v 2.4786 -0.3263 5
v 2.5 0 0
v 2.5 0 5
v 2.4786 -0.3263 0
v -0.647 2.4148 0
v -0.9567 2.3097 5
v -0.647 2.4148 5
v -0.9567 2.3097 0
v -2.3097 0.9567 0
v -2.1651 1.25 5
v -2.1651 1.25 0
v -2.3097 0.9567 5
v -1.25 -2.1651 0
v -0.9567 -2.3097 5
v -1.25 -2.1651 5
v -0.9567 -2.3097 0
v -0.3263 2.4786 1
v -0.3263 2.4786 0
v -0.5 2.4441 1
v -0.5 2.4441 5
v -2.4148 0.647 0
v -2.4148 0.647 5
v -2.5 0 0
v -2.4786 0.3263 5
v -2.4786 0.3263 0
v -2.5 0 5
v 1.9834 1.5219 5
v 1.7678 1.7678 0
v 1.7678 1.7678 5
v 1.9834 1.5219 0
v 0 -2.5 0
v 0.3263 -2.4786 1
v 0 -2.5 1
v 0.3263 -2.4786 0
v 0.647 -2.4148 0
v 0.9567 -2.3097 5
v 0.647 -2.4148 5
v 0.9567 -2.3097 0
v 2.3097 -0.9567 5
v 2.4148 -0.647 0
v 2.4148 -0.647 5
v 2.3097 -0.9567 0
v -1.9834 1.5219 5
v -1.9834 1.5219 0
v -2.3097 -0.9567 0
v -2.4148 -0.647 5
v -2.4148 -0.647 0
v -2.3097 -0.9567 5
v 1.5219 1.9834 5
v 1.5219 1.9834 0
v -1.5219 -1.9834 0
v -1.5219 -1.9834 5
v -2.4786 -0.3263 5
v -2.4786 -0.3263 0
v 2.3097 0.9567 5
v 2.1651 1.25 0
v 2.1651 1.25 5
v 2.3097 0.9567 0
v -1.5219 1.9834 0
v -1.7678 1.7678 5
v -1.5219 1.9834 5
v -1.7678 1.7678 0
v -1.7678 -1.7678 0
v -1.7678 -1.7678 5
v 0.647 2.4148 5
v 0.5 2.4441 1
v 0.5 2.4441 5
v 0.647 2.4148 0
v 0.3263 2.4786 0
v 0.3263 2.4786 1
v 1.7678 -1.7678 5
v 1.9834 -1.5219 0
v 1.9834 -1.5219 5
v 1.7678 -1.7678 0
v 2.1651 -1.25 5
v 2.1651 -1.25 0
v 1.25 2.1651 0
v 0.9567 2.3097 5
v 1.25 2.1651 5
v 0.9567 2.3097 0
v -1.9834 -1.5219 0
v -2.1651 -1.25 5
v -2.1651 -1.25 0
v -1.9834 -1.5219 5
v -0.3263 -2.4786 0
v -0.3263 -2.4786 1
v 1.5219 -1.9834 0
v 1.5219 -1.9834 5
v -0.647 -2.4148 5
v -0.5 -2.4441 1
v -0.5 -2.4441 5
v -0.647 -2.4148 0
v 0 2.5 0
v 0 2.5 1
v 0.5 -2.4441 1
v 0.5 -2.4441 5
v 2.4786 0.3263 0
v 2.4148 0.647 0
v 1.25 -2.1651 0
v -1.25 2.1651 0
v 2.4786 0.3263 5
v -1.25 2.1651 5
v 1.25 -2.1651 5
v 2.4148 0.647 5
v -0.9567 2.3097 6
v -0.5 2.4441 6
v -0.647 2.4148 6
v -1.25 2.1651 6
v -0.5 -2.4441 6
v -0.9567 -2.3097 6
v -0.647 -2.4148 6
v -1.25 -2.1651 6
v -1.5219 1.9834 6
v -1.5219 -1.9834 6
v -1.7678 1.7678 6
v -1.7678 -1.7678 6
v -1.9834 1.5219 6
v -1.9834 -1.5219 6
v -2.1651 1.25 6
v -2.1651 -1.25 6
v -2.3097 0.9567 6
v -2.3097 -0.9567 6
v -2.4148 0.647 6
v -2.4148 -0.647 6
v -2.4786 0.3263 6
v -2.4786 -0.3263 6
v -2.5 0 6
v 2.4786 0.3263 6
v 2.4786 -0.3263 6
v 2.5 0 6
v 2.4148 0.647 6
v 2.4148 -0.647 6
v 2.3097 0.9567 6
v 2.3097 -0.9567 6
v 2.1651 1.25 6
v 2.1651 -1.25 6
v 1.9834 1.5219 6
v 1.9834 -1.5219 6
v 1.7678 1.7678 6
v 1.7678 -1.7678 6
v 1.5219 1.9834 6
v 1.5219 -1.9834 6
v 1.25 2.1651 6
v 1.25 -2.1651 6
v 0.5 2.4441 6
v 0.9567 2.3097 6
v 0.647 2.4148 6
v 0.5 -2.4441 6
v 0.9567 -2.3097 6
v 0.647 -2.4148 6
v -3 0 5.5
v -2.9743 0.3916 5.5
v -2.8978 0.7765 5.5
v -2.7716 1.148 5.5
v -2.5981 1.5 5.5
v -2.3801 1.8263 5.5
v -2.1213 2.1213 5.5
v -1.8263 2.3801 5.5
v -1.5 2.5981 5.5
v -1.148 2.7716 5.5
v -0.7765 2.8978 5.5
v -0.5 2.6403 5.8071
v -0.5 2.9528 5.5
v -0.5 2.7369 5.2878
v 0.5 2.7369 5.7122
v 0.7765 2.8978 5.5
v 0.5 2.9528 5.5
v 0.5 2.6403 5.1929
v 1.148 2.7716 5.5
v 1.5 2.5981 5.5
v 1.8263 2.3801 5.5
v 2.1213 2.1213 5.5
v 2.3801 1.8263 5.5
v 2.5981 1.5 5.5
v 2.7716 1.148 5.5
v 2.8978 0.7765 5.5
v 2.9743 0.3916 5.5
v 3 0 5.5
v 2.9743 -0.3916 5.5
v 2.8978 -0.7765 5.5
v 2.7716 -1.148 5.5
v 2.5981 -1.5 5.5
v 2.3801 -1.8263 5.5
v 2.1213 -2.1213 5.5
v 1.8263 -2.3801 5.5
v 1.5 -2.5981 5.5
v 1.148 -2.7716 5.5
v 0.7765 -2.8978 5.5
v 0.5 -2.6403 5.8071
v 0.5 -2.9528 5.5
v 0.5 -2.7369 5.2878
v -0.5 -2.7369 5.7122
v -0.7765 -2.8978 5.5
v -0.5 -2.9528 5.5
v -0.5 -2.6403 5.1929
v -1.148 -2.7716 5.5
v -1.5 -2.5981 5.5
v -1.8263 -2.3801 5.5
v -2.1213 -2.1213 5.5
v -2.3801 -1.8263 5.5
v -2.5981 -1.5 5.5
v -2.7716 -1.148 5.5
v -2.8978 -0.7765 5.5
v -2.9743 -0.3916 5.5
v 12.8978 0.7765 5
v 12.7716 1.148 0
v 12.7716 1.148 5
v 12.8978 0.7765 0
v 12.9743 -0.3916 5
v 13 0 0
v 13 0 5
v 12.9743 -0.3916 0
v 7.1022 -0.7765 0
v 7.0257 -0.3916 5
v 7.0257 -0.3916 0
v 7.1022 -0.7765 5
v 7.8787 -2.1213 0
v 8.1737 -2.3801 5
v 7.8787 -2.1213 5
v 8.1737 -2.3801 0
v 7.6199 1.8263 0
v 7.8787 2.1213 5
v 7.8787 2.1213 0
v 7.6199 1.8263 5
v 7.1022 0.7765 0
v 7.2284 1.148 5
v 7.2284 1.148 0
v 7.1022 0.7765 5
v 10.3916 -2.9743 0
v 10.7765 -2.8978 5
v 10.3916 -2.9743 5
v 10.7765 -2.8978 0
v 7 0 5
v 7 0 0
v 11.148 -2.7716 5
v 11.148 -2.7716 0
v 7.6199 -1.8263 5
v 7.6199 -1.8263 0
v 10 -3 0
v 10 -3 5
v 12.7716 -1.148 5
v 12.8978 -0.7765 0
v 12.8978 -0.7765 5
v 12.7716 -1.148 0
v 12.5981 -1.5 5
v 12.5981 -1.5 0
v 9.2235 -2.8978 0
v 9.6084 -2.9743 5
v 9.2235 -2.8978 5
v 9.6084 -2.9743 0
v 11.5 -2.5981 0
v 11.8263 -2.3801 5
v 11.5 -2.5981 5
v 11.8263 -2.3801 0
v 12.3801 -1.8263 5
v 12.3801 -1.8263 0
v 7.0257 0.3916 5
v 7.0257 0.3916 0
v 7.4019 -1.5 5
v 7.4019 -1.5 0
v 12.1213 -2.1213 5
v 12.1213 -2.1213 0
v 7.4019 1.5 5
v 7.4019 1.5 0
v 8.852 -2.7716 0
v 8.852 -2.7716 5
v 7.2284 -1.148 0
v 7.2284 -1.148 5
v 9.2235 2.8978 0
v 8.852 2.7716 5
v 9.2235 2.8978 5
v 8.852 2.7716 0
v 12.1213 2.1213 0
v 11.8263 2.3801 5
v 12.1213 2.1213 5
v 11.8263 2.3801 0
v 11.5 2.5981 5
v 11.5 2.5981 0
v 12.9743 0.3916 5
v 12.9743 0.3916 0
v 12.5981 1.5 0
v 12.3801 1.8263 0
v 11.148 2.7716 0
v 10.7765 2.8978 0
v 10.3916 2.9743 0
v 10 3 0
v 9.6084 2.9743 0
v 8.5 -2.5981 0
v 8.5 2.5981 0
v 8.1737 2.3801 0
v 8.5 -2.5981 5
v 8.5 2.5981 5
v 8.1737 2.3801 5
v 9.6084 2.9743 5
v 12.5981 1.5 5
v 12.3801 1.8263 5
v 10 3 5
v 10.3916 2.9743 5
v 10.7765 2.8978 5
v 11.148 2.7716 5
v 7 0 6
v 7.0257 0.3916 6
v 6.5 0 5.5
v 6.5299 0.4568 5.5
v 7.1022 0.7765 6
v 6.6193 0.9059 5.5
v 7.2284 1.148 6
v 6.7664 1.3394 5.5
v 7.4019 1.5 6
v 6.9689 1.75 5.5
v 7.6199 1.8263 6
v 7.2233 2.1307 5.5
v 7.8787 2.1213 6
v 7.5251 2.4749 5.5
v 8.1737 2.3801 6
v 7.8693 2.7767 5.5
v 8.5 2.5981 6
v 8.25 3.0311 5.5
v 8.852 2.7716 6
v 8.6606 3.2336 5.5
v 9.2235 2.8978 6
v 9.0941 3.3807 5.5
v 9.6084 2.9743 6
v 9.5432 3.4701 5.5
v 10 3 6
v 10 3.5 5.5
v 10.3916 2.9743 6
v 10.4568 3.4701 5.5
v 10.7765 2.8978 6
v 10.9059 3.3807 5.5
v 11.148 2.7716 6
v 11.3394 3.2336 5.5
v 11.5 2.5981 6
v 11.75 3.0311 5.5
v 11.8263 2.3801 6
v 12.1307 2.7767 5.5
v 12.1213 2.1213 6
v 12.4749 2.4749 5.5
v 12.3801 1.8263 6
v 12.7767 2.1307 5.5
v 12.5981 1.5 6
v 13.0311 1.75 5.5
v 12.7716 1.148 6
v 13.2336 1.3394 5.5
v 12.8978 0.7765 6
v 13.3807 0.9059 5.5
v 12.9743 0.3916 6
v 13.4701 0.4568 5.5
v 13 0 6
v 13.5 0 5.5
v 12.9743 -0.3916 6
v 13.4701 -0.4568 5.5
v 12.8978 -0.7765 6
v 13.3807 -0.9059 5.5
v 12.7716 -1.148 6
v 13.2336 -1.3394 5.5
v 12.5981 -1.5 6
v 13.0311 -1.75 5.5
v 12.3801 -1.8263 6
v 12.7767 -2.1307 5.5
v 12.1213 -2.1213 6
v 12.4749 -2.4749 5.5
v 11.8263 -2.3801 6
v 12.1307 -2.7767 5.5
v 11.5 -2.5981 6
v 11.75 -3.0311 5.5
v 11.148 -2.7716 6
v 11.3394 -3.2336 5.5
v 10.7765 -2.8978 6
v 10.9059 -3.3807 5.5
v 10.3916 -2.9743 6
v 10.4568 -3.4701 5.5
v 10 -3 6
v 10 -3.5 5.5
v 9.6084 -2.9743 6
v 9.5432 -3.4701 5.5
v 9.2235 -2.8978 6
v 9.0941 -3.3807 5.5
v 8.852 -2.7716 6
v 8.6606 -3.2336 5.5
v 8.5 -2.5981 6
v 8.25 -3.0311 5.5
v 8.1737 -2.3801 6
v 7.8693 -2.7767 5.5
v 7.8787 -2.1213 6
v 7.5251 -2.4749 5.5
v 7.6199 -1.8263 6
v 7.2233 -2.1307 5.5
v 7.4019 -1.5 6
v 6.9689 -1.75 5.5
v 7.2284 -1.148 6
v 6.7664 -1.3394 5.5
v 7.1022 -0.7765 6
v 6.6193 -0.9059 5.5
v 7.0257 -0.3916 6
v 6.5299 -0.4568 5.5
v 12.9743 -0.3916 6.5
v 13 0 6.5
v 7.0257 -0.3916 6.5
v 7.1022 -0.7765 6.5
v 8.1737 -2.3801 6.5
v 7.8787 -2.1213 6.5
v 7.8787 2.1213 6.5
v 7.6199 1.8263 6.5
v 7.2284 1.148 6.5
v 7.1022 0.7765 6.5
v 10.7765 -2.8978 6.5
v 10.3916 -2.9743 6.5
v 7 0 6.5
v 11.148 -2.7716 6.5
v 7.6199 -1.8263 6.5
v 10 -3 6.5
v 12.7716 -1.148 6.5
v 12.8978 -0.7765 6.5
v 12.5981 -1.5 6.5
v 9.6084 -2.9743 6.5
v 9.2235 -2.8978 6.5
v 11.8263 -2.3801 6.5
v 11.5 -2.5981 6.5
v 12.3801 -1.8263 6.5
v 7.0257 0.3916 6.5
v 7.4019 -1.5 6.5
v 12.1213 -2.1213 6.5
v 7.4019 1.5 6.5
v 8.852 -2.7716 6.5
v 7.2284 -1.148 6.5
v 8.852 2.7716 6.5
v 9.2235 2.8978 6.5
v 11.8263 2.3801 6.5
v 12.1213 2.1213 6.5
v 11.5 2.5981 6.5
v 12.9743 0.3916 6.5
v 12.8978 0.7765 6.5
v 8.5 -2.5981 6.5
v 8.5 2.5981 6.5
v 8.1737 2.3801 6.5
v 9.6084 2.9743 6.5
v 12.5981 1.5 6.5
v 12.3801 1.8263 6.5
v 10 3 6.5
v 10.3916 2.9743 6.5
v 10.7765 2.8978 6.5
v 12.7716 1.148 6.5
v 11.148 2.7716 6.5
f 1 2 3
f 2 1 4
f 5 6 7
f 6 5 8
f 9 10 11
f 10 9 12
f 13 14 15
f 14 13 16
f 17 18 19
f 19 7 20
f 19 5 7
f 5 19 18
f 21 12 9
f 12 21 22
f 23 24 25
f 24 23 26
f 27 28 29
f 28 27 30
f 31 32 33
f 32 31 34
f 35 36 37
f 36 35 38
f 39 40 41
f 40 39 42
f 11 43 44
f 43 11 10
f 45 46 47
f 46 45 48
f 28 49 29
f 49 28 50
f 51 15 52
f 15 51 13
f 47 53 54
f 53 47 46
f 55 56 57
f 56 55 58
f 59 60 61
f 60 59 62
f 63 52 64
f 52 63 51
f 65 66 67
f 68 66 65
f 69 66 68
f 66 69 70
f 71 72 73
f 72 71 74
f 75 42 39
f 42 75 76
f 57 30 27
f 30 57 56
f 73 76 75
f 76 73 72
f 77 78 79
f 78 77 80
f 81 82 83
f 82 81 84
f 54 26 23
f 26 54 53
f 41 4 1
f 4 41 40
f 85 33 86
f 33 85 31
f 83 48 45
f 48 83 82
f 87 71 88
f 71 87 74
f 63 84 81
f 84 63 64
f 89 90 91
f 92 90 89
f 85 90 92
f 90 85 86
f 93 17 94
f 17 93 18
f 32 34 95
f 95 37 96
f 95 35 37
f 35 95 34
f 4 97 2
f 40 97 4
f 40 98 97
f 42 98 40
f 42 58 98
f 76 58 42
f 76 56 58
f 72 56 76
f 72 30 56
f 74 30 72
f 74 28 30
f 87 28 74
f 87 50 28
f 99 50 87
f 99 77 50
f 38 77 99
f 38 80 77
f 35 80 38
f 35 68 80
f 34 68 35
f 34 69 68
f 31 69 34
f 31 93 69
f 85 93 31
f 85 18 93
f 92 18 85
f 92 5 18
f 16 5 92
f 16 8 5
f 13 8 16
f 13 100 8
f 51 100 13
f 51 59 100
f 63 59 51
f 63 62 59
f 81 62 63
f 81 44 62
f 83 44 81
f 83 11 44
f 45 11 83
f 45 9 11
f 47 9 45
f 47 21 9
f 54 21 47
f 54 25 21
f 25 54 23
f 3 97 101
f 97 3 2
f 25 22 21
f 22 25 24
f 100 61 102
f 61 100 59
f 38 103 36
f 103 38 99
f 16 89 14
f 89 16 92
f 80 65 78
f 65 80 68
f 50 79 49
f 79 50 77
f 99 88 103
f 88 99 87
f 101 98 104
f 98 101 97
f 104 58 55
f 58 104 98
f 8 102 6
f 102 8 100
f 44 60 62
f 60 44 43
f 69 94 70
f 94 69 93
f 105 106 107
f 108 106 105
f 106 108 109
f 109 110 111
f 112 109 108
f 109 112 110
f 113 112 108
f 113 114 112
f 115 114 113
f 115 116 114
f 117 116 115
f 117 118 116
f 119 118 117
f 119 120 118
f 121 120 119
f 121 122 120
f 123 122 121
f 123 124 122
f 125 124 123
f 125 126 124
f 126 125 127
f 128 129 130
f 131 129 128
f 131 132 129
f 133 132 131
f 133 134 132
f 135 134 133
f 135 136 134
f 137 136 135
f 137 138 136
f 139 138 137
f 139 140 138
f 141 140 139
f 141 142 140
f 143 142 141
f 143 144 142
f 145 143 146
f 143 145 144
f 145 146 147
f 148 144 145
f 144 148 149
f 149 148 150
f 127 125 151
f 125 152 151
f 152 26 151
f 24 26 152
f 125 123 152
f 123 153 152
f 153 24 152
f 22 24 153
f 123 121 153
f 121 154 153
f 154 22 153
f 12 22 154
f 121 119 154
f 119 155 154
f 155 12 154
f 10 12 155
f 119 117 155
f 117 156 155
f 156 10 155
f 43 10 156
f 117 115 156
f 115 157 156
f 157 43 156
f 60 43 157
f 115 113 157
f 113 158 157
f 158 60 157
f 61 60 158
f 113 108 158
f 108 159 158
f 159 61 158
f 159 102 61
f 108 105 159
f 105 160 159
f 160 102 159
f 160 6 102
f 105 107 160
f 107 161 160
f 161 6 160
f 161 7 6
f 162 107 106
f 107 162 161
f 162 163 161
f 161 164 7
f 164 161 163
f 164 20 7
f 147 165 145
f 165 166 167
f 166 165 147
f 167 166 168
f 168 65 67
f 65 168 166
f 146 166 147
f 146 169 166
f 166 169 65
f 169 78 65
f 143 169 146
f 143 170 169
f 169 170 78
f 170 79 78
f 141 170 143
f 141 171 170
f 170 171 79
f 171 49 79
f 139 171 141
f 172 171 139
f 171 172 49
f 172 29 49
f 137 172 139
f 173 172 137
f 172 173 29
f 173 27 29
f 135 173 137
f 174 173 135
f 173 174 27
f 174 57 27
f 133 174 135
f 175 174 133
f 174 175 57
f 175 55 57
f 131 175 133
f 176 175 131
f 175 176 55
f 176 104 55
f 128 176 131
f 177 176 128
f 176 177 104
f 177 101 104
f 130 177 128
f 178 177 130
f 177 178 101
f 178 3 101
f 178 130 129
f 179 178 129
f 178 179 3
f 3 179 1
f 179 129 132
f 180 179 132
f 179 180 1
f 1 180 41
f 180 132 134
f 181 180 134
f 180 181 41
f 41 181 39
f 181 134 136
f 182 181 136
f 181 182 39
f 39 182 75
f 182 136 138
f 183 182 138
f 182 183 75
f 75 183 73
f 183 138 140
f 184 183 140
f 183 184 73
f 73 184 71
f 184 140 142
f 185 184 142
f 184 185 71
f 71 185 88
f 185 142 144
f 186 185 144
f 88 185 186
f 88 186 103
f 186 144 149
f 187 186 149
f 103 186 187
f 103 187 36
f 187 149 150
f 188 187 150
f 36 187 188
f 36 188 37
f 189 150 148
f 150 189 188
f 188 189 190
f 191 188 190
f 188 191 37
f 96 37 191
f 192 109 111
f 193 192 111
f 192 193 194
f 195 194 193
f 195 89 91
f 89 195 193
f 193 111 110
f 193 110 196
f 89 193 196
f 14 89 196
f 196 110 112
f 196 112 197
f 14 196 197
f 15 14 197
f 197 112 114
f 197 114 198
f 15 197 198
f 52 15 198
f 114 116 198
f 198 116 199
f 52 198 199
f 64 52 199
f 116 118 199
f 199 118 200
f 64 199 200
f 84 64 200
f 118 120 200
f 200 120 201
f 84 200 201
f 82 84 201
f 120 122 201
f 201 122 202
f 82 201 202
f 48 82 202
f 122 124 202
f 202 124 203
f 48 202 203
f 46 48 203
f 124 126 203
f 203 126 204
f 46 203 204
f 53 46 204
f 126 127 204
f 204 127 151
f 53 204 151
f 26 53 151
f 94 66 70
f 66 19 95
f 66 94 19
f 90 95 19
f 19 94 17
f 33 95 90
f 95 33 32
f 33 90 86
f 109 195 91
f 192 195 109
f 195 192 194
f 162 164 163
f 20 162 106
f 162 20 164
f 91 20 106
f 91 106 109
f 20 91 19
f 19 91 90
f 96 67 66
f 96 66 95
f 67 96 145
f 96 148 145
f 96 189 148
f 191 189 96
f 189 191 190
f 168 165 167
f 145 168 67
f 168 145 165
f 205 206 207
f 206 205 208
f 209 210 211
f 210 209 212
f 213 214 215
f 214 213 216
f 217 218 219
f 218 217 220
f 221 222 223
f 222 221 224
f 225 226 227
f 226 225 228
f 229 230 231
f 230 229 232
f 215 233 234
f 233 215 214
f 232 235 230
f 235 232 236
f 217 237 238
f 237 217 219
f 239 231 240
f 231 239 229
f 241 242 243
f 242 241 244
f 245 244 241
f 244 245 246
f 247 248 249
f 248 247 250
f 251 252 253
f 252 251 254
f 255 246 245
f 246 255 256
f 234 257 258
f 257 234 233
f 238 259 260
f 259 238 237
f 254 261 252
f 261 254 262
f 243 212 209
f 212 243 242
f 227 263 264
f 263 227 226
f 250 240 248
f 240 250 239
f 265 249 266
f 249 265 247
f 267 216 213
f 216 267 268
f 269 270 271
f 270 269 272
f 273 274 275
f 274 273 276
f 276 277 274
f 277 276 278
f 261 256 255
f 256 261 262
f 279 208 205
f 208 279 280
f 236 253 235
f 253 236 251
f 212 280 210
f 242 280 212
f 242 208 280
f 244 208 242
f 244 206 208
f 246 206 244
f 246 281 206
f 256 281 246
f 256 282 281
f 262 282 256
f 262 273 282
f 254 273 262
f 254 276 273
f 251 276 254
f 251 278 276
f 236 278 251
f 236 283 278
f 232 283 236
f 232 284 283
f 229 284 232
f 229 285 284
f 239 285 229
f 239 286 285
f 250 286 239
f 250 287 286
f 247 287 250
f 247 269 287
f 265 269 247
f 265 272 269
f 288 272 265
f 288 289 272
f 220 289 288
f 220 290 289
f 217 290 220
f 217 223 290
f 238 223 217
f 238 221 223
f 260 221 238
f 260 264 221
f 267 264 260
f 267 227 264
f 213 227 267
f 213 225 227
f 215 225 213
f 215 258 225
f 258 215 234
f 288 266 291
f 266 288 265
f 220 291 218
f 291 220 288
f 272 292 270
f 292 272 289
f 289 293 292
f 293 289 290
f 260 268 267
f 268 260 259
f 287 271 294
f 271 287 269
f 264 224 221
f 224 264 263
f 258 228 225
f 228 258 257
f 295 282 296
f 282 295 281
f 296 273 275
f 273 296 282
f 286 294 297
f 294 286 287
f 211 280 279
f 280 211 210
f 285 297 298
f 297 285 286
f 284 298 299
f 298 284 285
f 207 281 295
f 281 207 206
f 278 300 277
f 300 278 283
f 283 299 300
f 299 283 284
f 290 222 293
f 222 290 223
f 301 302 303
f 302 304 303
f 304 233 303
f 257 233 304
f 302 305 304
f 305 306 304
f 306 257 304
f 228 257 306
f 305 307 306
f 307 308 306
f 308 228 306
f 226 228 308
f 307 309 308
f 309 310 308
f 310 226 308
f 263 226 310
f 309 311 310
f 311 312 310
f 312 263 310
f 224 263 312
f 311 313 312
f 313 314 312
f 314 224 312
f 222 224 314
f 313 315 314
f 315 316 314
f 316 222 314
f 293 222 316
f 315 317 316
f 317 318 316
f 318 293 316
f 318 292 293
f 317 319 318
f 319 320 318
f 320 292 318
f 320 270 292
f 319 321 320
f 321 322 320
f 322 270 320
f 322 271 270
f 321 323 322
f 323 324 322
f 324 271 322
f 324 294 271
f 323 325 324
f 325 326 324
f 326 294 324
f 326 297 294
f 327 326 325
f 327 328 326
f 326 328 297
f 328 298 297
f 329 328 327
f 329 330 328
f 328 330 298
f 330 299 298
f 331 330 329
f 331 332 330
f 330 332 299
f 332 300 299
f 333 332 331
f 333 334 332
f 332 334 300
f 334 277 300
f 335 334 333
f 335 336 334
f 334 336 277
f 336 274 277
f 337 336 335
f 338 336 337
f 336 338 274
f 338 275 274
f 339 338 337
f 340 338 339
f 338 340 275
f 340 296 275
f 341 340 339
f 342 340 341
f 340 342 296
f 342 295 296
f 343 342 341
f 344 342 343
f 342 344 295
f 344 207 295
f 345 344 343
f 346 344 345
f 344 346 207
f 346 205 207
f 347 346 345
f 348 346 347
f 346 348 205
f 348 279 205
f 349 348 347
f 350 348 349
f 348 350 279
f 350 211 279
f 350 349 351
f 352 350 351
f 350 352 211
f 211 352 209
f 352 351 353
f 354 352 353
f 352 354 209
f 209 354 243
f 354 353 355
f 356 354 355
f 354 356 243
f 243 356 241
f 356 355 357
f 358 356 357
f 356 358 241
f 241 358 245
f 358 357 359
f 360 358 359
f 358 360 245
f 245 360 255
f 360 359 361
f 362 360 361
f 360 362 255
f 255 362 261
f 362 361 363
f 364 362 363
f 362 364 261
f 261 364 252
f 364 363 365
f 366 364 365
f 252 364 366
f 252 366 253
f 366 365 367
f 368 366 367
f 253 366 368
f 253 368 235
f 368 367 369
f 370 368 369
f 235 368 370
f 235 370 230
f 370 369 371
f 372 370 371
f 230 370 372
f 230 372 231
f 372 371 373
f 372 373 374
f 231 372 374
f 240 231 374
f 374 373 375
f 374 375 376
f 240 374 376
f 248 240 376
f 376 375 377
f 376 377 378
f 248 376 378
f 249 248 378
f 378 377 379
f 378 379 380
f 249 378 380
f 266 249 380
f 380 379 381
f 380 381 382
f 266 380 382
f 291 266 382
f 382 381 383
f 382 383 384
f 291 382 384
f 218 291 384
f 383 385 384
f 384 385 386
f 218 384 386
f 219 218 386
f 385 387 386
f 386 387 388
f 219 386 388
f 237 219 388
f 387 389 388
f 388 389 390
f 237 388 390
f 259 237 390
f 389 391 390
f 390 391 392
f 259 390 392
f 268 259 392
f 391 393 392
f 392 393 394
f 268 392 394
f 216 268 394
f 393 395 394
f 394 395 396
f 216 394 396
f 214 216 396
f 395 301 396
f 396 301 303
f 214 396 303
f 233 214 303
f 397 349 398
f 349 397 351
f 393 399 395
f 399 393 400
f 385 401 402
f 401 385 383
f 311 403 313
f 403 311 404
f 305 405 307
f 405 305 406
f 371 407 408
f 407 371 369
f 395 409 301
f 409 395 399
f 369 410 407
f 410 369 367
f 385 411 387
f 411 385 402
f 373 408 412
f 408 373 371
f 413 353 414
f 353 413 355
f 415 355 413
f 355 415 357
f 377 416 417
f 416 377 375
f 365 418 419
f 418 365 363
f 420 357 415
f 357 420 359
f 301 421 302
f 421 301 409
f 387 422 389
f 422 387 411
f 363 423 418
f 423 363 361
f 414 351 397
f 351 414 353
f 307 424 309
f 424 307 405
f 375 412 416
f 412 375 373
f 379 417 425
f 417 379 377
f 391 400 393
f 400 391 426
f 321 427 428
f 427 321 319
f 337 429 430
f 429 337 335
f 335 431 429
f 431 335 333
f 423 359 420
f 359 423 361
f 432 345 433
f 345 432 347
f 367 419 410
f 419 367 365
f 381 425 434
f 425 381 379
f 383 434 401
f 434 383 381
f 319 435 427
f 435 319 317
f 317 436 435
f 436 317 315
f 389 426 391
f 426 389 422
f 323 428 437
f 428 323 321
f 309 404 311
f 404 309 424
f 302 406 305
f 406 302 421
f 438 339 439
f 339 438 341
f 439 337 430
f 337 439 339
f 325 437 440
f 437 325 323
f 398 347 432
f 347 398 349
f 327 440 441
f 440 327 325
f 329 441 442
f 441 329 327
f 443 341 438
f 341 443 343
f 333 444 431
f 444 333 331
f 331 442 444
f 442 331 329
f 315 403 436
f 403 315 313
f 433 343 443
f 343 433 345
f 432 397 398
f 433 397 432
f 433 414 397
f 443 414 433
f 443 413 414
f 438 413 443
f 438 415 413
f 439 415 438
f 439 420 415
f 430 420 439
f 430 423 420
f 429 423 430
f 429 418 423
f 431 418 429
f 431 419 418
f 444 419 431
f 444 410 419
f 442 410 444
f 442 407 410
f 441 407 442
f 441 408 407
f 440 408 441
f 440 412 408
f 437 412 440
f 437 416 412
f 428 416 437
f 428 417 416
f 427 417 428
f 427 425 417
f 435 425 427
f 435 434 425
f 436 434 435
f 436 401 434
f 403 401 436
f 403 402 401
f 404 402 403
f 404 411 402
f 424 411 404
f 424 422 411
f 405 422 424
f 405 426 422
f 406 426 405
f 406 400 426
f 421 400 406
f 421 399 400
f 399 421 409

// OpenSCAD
module pin(type, shaft_r = 2.5, lip_r = 3, height = 6, spacing = 0.5, lip_fn = 4) {
    r_diff = lip_r - shaft_r;
    
    module pin_base(shaft_r, lip_r, height) {        
        linear_extrude(height) 
            circle(shaft_r);
            
        translate([0, 0, height - r_diff]) 
            rotate_extrude() 
                translate([lip_r - r_diff, 0, 0]) 
                    circle(r_diff, $fn = lip_fn);
    }

    module pinpeg() {
        difference() {
            pin_base(shaft_r, lip_r, height);
            
            translate([0, 0, r_diff * 2])  
                linear_extrude(height - r_diff * 2) 
                    square([r_diff * 2, lip_r * 2], center = true);
        
        }
    }

    module pinheightole() {
        pin_base(shaft_r + spacing, lip_r + spacing, height);
        translate([0, 0, height]) 
            linear_extrude(spacing) 
                circle(lip_r);
        
    }

    if(type == "peg") {
        pinpeg();
    } else if(type == "hole") {
        pinheightole();
    }
}



$fn = 48;

shaft_r = 2.5;
lip_r = 3;
height = 6;
spacing = 0.5;

*translate([0, 0, -1.5]) linear_extrude(1.5) 
        circle(lip_r * 1.5);
pin("peg", shaft_r, lip_r, height, spacing);
    
translate([10, 0, 0]) difference() {
    *linear_extrude(height - 0.001) 
        circle(lip_r * 1.5);
        
    pin("hole", shaft_r, lip_r, height, spacing);
}
